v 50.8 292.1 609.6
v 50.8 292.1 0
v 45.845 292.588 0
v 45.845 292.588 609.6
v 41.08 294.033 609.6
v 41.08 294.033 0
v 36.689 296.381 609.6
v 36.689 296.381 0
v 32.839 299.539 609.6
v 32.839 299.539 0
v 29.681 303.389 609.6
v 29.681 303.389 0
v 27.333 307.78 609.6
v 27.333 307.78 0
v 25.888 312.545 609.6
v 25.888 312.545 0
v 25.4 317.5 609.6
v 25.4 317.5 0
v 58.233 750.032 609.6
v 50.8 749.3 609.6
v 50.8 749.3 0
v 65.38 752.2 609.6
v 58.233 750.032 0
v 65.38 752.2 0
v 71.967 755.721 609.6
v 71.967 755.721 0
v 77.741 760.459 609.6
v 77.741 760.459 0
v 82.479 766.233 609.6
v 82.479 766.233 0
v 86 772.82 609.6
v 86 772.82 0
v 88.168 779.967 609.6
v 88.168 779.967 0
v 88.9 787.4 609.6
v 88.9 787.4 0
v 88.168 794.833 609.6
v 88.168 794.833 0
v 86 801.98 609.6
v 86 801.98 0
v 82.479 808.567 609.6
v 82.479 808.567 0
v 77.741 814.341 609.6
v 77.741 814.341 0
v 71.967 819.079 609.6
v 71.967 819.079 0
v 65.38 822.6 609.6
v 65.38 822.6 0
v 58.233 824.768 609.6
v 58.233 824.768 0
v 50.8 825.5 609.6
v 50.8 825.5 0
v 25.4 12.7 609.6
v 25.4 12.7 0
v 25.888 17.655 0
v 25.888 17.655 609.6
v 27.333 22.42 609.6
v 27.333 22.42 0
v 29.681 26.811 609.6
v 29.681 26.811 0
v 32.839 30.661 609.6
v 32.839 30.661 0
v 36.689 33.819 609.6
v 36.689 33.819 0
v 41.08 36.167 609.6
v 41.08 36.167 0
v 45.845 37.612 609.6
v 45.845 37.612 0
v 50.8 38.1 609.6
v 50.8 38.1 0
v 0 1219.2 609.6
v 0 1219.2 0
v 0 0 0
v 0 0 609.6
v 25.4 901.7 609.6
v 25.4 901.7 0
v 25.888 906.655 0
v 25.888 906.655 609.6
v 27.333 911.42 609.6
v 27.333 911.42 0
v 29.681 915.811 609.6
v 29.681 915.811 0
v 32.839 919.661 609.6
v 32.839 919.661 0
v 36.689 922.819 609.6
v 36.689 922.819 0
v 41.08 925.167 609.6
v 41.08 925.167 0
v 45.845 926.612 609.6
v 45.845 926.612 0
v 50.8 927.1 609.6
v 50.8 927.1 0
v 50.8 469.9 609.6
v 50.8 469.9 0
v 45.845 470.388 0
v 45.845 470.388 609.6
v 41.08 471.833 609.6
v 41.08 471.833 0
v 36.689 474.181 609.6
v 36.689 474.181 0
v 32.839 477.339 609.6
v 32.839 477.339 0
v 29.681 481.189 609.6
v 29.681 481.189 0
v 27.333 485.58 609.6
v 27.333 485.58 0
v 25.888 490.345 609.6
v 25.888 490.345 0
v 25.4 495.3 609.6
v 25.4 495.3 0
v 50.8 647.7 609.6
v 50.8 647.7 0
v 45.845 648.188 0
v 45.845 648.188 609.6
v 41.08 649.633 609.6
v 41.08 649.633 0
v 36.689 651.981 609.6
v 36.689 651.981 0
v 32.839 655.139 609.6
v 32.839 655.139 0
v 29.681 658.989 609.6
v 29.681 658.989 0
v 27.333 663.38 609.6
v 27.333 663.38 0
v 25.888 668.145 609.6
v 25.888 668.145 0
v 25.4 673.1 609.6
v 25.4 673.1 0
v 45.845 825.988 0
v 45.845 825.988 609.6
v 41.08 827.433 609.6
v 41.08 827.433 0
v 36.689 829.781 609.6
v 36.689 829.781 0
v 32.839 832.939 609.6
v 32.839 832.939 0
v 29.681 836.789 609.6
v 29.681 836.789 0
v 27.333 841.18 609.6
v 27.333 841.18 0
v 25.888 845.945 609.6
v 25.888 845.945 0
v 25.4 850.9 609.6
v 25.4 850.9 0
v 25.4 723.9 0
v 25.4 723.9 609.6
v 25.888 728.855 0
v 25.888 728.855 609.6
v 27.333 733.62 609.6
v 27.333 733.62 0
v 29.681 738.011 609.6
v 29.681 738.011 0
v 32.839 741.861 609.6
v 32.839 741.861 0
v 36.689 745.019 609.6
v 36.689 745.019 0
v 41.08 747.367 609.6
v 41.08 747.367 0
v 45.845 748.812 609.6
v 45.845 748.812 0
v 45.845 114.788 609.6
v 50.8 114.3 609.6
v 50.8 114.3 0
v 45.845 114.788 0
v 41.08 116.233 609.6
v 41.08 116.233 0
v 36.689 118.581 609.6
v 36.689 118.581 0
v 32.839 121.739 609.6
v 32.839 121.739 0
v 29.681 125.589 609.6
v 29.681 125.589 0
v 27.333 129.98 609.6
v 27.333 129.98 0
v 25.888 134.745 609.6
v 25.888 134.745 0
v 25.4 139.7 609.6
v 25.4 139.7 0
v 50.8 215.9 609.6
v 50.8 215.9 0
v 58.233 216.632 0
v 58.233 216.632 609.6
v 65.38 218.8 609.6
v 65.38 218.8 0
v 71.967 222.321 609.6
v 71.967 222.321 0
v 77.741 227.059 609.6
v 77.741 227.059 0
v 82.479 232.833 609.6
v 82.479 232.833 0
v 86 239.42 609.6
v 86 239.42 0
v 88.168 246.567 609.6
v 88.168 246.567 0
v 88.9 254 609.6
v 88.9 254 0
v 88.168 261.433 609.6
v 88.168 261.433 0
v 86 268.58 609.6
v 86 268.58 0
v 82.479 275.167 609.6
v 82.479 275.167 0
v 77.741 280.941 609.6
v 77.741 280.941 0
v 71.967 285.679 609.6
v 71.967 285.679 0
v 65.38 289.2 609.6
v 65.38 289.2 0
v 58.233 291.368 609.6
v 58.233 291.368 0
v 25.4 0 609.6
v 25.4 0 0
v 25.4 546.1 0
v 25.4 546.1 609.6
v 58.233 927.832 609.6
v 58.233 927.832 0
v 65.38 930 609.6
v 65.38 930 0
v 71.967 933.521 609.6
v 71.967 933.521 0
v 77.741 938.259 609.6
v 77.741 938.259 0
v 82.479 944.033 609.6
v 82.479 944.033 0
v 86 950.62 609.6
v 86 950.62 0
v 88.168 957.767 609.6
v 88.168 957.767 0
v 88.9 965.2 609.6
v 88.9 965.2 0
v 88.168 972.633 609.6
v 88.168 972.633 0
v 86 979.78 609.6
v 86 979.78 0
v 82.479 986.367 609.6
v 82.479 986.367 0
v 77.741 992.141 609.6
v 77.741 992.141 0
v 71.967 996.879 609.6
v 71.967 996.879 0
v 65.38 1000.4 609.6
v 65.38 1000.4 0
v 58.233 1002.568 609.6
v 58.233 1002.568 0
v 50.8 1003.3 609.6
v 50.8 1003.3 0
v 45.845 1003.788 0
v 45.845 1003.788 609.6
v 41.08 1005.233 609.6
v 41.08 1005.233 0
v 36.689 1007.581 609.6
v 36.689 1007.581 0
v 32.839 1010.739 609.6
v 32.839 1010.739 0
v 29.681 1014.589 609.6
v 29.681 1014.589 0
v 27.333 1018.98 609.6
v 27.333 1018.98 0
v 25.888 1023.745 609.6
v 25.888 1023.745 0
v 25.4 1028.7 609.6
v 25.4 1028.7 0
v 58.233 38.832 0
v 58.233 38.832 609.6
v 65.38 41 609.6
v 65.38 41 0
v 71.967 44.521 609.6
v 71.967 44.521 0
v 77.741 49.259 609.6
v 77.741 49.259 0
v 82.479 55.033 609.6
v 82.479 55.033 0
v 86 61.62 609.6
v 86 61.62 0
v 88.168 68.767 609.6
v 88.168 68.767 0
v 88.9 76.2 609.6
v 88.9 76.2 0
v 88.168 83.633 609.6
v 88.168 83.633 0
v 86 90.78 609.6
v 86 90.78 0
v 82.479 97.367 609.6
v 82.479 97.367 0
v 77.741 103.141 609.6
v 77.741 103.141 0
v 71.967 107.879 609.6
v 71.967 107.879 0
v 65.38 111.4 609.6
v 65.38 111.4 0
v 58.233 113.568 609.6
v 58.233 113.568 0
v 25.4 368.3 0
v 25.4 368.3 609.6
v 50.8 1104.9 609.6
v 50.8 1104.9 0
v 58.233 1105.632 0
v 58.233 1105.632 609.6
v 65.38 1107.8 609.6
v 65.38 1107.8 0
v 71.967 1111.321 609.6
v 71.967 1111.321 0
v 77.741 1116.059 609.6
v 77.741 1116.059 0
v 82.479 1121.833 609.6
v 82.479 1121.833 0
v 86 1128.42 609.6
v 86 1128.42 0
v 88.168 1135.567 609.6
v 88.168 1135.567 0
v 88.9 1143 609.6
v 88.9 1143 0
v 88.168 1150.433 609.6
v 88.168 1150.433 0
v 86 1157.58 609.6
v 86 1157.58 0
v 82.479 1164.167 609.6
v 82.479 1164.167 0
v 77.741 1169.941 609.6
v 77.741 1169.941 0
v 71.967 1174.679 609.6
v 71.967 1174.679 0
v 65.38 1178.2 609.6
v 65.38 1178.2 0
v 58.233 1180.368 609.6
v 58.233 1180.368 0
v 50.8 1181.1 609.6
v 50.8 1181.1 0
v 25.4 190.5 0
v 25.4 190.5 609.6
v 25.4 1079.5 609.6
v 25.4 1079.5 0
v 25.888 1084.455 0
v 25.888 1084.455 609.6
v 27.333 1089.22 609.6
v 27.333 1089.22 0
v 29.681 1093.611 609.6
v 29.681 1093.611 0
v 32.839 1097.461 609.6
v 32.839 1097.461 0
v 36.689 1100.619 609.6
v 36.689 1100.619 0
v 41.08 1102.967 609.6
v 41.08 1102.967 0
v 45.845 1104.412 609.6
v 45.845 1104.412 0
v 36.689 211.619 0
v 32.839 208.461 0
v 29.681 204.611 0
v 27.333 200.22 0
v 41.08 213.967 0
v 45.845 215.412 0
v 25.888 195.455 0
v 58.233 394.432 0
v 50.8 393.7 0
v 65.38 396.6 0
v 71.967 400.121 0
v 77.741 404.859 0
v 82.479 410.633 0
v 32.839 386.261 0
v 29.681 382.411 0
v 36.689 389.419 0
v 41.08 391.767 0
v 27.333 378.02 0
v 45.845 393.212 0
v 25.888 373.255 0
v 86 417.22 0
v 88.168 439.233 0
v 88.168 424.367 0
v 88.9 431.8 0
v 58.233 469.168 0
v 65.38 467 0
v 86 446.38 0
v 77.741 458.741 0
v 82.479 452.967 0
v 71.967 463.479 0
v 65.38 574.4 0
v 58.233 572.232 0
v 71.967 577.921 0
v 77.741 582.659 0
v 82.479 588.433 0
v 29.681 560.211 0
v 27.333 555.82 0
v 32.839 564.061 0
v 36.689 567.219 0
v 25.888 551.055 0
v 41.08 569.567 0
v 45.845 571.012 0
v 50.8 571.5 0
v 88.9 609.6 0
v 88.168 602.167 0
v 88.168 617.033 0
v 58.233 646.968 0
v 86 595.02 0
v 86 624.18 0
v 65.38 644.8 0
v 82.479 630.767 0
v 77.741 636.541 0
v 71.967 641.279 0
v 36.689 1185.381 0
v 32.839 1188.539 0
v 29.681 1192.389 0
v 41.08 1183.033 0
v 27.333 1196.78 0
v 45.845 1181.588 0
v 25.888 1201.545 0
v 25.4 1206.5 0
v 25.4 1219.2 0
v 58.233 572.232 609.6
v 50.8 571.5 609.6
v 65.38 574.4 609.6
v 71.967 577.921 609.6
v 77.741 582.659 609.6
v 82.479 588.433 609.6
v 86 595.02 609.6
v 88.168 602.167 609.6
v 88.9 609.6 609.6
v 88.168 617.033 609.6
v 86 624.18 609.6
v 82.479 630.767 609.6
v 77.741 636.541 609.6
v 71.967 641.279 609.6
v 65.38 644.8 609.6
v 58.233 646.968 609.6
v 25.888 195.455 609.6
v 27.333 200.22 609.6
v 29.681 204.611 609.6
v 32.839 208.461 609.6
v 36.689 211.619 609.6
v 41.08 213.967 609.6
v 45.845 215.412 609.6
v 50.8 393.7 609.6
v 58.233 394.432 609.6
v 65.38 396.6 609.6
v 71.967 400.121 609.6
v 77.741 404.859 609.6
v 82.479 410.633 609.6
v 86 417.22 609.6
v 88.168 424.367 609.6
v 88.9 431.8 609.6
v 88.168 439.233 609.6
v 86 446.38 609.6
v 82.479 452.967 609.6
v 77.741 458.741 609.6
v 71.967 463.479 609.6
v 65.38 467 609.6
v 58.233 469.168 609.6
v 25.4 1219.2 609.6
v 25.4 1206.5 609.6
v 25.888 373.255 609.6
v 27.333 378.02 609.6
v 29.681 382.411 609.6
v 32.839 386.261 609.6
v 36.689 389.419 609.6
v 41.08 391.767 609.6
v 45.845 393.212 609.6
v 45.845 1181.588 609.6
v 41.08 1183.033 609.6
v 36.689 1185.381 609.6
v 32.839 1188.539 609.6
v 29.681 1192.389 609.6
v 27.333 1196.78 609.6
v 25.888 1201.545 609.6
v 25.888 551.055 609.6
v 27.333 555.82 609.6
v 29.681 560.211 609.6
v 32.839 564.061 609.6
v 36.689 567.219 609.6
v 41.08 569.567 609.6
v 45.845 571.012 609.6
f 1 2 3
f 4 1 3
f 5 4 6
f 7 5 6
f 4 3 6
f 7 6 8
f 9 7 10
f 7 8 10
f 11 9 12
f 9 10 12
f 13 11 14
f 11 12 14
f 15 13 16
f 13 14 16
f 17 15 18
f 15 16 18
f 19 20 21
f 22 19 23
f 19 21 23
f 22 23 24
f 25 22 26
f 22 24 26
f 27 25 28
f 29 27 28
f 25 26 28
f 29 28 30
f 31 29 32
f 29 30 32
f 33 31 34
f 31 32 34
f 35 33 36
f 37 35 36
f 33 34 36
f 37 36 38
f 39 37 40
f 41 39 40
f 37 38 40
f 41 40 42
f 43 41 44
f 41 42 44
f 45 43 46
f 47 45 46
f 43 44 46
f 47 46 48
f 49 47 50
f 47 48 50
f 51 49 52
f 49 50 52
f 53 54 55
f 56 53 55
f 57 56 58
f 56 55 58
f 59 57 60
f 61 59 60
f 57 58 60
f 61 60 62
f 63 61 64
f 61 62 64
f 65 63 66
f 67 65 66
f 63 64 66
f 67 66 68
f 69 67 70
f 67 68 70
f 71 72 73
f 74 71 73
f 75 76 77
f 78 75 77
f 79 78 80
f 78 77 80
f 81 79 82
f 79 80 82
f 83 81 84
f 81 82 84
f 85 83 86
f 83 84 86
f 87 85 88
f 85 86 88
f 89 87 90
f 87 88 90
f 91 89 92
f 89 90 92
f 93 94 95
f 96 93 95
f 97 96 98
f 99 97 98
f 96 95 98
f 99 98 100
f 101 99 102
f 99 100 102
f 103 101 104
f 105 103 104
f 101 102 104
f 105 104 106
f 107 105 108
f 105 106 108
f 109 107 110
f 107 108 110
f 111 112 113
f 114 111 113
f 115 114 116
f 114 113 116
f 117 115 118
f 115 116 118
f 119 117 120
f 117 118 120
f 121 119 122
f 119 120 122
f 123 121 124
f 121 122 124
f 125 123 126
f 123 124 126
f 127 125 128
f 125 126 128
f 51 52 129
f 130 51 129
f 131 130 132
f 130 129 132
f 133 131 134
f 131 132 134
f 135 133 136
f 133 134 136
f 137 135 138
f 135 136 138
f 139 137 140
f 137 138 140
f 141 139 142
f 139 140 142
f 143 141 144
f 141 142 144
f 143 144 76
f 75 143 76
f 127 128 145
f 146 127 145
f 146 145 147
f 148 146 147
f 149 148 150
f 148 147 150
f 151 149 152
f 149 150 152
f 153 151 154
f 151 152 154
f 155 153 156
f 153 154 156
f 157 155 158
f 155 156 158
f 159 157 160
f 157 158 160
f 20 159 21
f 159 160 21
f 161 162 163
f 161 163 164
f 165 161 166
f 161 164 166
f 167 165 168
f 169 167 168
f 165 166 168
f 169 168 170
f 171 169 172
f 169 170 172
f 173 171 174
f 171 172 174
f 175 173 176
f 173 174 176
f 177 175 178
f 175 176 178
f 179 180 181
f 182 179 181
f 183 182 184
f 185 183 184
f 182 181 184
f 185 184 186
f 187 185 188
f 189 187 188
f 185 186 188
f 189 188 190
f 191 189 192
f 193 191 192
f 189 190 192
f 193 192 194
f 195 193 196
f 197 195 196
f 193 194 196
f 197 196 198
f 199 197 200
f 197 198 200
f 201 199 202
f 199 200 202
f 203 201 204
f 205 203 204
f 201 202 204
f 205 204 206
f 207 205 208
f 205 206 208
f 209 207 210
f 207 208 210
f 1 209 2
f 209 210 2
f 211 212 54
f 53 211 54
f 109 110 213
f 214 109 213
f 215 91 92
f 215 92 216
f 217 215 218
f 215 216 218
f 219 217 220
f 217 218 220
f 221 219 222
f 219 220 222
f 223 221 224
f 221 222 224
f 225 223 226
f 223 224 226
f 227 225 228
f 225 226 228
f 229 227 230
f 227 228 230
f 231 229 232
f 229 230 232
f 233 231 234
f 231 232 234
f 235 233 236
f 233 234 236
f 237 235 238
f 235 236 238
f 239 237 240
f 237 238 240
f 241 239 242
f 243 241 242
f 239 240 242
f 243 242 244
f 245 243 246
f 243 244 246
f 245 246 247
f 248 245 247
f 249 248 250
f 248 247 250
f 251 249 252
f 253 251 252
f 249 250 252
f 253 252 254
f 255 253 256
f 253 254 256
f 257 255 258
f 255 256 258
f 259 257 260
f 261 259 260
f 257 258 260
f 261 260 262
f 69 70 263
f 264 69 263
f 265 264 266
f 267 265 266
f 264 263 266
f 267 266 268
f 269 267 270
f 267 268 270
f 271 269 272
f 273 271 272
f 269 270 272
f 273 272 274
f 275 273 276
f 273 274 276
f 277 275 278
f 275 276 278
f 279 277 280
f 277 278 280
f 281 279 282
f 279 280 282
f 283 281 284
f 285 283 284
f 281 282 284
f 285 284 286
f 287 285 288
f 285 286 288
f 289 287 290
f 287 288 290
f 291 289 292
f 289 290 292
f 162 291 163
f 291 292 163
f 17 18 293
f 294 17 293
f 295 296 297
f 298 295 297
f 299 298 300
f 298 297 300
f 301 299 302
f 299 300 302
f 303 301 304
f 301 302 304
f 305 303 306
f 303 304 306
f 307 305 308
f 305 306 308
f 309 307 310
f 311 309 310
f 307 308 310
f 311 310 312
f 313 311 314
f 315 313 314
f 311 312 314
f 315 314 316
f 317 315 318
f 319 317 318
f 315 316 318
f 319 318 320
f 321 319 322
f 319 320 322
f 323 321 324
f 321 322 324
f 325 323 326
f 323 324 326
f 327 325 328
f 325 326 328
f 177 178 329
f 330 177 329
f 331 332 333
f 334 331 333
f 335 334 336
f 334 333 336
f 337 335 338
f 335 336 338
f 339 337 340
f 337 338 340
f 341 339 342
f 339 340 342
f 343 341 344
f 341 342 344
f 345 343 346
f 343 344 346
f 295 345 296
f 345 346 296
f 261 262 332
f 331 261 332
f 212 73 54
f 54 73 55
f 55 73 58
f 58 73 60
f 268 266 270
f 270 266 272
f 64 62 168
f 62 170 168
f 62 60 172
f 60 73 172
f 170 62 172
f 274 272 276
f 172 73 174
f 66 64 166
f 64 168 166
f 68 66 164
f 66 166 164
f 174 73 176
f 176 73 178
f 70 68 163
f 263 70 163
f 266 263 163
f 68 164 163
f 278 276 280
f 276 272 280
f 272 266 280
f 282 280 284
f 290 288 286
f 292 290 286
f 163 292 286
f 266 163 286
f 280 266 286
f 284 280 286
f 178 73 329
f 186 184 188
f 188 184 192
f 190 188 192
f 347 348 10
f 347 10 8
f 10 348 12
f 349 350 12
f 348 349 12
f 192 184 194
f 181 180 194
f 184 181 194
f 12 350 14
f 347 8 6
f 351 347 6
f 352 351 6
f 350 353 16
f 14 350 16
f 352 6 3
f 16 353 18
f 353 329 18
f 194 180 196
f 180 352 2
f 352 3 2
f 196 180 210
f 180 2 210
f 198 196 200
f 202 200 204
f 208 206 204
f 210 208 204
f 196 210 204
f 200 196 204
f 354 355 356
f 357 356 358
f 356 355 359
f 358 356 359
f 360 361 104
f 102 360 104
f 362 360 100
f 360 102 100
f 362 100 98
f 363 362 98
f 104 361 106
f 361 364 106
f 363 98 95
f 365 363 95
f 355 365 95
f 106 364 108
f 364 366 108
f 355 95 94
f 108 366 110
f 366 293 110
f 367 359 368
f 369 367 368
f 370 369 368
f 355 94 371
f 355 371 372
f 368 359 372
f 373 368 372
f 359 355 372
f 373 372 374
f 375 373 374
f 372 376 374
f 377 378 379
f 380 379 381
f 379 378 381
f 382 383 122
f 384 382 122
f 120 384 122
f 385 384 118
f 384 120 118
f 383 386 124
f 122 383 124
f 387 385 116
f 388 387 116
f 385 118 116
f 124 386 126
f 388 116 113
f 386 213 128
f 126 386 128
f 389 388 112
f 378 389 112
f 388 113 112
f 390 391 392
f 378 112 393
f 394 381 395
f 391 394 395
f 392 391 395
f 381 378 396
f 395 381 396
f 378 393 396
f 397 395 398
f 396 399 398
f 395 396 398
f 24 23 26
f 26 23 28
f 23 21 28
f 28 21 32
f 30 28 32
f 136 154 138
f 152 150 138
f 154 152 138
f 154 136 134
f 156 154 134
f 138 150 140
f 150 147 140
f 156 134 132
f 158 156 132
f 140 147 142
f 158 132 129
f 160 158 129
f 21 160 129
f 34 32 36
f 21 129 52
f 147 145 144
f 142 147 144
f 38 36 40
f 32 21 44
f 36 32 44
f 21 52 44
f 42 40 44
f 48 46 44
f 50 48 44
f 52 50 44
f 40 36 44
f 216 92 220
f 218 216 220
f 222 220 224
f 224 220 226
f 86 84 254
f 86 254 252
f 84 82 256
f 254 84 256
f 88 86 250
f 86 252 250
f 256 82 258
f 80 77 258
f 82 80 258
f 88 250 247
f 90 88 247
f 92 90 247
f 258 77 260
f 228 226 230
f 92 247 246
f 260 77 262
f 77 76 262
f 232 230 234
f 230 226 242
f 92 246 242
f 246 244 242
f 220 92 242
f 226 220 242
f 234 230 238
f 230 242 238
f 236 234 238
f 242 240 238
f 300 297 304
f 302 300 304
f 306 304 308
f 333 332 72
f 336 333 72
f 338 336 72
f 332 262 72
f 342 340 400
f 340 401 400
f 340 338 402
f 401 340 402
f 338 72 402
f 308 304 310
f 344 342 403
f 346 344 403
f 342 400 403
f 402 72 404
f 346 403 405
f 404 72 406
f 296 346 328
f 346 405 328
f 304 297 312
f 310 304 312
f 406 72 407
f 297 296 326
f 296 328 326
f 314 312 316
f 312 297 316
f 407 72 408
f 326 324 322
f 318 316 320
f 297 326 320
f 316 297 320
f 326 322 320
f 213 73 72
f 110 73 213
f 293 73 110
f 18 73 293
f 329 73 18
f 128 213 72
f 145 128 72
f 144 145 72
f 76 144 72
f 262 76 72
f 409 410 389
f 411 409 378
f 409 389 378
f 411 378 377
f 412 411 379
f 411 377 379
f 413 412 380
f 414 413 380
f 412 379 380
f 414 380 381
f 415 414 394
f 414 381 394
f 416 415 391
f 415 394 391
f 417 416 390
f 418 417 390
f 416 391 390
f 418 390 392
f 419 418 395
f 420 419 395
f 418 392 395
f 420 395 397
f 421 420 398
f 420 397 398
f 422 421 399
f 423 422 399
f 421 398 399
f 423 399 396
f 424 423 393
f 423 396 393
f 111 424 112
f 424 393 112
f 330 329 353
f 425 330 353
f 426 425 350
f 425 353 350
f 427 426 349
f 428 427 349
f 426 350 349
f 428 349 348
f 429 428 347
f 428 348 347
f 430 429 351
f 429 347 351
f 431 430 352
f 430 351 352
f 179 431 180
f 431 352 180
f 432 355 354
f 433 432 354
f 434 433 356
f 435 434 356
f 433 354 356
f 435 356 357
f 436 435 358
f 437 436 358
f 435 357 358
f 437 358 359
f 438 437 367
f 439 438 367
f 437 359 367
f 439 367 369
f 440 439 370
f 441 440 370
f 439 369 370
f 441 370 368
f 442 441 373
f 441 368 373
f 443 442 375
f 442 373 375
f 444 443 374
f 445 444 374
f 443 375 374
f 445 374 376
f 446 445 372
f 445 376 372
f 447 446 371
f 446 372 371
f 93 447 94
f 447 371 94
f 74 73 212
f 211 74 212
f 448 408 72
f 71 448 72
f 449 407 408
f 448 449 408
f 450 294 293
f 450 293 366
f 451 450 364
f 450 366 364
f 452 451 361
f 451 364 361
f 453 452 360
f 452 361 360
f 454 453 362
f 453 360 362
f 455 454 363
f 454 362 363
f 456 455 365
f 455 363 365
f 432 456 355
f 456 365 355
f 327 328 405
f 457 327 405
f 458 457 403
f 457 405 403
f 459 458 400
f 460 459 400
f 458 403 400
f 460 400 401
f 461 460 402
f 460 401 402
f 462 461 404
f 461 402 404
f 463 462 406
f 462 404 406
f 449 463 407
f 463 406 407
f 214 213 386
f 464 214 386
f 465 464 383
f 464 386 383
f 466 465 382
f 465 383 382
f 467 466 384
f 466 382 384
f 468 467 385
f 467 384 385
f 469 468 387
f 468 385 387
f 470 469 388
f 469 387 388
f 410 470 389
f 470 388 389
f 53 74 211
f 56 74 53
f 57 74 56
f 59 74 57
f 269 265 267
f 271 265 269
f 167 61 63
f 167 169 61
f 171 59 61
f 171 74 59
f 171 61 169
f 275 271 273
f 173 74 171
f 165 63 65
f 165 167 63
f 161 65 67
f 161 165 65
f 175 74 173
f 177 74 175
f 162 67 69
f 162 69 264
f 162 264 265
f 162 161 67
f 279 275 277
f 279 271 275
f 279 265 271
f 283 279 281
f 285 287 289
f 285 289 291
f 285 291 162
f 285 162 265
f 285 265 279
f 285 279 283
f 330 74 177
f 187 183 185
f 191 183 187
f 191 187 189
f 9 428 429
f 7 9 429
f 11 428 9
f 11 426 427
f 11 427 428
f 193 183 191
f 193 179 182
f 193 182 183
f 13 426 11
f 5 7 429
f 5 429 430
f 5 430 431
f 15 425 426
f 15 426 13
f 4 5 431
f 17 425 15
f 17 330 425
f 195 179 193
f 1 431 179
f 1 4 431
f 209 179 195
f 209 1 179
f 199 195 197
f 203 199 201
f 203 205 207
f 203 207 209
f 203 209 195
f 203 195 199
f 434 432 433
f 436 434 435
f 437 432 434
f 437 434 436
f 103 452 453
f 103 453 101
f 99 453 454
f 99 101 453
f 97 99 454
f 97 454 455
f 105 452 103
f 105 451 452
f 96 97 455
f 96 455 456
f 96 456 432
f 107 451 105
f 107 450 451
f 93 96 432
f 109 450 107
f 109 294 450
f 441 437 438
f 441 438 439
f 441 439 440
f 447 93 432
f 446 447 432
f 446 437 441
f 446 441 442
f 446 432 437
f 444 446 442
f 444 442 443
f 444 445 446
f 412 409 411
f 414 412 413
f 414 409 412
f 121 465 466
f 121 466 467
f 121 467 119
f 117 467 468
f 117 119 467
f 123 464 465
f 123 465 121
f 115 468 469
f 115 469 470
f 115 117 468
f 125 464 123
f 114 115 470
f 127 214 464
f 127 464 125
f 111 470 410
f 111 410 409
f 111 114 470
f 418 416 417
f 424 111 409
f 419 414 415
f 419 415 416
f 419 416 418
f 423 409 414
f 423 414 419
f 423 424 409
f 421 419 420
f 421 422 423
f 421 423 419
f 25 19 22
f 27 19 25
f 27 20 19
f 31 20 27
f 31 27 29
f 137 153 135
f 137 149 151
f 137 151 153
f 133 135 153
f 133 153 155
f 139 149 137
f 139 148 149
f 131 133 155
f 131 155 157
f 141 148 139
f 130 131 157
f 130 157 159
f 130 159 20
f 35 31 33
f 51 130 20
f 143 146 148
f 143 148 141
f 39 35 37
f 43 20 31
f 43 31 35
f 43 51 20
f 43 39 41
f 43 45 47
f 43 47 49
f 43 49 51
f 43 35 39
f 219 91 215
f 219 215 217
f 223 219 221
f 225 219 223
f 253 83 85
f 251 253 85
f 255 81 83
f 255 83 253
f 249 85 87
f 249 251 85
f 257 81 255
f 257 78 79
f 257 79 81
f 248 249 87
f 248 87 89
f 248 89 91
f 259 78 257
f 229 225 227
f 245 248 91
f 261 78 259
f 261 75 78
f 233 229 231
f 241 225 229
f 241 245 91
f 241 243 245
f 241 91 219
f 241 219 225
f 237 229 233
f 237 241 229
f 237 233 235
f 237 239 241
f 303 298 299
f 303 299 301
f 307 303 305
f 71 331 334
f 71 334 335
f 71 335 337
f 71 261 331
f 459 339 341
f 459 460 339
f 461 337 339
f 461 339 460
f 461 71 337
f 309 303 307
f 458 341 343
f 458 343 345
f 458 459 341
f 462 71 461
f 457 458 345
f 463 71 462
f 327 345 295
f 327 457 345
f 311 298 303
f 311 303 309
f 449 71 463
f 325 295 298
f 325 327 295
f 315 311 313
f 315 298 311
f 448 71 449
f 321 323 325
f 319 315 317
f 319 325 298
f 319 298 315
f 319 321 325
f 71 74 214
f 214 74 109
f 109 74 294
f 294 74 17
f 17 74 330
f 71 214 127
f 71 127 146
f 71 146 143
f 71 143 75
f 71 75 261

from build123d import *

# Parameters (mm, degrees)
F1_DEPTH = 609.6


with BuildPart() as f1:
    # F0 (on Top) → F1 (new body)
    with BuildSketch(Plane.XY):
        with BuildLine():
            Line((0, 1219.2), (0, 0))
            Line((0, 0), (25.4, 0))
            Line((25.4, 0), (25.4, 12.7))
            Line((25.4, 12.7), (25.4, 139.7))
            Line((25.4, 139.7), (25.4, 190.5))
            Line((25.4, 190.5), (25.4, 317.5))
            Line((25.4, 317.5), (25.4, 368.3))
            Line((25.4, 368.3), (25.4, 495.3))
            Line((25.4, 495.3), (25.4, 546.1))
            ThreePointArc((25.4, 546.1), (32.839488, 564.060512), (50.8, 571.5))
            ThreePointArc((50.8, 571.5), (88.9, 609.6), (50.8, 647.7))
            ThreePointArc((50.8, 647.7), (32.839488, 655.139488), (25.4, 673.1))
            Line((25.4, 673.1), (25.4, 723.9))
            Line((25.4, 723.9), (25.4, 850.9))
            Line((25.4, 850.9), (25.4, 901.7))
            Line((25.4, 901.7), (25.4, 1028.7))
            Line((25.4, 1028.7), (25.4, 1079.5))
            Line((25.4, 1079.5), (25.4, 1206.5))
            Line((25.4, 1206.5), (25.4, 1219.2))
            Line((25.4, 1219.2), (0, 1219.2))
        make_face()
        with BuildLine():
            Line((25.4, 139.7), (25.4, 12.7))
            ThreePointArc((25.4, 12.7), (32.839488, 30.660512), (50.8, 38.1))
            ThreePointArc((50.8, 38.1), (88.9, 76.2), (50.8, 114.3))
            ThreePointArc((50.8, 114.3), (32.839488, 121.739488), (25.4, 139.7))
        make_face()
        with BuildLine():
            ThreePointArc((50.8, 1181.1), (32.839488, 1188.539488), (25.4, 1206.5))
            Line((25.4, 1206.5), (25.4, 1079.5))
            ThreePointArc((25.4, 1079.5), (32.839488, 1097.460512), (50.8, 1104.9))
            ThreePointArc((50.8, 1104.9), (88.9, 1143), (50.8, 1181.1))
        make_face()
        with BuildLine():
            Line((25.4, 317.5), (25.4, 190.5))
            ThreePointArc((25.4, 190.5), (32.839488, 208.460512), (50.8, 215.9))
            ThreePointArc((50.8, 215.9), (88.9, 254), (50.8, 292.1))
            ThreePointArc((50.8, 292.1), (32.839488, 299.539488), (25.4, 317.5))
        make_face()
        with BuildLine():
            ThreePointArc((50.8, 1003.3), (32.839488, 1010.739488), (25.4, 1028.7))
            Line((25.4, 1028.7), (25.4, 901.7))
            ThreePointArc((25.4, 901.7), (32.839488, 919.660512), (50.8, 927.1))
            ThreePointArc((50.8, 927.1), (88.9, 965.2), (50.8, 1003.3))
        make_face()
        with BuildLine():
            Line((25.4, 495.3), (25.4, 368.3))
            ThreePointArc((25.4, 368.3), (32.839488, 386.260512), (50.8, 393.7))
            ThreePointArc((50.8, 393.7), (88.9, 431.8), (50.8, 469.9))
            ThreePointArc((50.8, 469.9), (32.839488, 477.339488), (25.4, 495.3))
        make_face()
        with BuildLine():
            ThreePointArc((50.8, 825.5), (32.839488, 832.939488), (25.4, 850.9))
            Line((25.4, 850.9), (25.4, 723.9))
            ThreePointArc((25.4, 723.9), (32.839488, 741.860512), (50.8, 749.3))
            ThreePointArc((50.8, 749.3), (88.9, 787.4), (50.8, 825.5))
        make_face()
    extrude(amount=F1_DEPTH)


solid = f1.part
